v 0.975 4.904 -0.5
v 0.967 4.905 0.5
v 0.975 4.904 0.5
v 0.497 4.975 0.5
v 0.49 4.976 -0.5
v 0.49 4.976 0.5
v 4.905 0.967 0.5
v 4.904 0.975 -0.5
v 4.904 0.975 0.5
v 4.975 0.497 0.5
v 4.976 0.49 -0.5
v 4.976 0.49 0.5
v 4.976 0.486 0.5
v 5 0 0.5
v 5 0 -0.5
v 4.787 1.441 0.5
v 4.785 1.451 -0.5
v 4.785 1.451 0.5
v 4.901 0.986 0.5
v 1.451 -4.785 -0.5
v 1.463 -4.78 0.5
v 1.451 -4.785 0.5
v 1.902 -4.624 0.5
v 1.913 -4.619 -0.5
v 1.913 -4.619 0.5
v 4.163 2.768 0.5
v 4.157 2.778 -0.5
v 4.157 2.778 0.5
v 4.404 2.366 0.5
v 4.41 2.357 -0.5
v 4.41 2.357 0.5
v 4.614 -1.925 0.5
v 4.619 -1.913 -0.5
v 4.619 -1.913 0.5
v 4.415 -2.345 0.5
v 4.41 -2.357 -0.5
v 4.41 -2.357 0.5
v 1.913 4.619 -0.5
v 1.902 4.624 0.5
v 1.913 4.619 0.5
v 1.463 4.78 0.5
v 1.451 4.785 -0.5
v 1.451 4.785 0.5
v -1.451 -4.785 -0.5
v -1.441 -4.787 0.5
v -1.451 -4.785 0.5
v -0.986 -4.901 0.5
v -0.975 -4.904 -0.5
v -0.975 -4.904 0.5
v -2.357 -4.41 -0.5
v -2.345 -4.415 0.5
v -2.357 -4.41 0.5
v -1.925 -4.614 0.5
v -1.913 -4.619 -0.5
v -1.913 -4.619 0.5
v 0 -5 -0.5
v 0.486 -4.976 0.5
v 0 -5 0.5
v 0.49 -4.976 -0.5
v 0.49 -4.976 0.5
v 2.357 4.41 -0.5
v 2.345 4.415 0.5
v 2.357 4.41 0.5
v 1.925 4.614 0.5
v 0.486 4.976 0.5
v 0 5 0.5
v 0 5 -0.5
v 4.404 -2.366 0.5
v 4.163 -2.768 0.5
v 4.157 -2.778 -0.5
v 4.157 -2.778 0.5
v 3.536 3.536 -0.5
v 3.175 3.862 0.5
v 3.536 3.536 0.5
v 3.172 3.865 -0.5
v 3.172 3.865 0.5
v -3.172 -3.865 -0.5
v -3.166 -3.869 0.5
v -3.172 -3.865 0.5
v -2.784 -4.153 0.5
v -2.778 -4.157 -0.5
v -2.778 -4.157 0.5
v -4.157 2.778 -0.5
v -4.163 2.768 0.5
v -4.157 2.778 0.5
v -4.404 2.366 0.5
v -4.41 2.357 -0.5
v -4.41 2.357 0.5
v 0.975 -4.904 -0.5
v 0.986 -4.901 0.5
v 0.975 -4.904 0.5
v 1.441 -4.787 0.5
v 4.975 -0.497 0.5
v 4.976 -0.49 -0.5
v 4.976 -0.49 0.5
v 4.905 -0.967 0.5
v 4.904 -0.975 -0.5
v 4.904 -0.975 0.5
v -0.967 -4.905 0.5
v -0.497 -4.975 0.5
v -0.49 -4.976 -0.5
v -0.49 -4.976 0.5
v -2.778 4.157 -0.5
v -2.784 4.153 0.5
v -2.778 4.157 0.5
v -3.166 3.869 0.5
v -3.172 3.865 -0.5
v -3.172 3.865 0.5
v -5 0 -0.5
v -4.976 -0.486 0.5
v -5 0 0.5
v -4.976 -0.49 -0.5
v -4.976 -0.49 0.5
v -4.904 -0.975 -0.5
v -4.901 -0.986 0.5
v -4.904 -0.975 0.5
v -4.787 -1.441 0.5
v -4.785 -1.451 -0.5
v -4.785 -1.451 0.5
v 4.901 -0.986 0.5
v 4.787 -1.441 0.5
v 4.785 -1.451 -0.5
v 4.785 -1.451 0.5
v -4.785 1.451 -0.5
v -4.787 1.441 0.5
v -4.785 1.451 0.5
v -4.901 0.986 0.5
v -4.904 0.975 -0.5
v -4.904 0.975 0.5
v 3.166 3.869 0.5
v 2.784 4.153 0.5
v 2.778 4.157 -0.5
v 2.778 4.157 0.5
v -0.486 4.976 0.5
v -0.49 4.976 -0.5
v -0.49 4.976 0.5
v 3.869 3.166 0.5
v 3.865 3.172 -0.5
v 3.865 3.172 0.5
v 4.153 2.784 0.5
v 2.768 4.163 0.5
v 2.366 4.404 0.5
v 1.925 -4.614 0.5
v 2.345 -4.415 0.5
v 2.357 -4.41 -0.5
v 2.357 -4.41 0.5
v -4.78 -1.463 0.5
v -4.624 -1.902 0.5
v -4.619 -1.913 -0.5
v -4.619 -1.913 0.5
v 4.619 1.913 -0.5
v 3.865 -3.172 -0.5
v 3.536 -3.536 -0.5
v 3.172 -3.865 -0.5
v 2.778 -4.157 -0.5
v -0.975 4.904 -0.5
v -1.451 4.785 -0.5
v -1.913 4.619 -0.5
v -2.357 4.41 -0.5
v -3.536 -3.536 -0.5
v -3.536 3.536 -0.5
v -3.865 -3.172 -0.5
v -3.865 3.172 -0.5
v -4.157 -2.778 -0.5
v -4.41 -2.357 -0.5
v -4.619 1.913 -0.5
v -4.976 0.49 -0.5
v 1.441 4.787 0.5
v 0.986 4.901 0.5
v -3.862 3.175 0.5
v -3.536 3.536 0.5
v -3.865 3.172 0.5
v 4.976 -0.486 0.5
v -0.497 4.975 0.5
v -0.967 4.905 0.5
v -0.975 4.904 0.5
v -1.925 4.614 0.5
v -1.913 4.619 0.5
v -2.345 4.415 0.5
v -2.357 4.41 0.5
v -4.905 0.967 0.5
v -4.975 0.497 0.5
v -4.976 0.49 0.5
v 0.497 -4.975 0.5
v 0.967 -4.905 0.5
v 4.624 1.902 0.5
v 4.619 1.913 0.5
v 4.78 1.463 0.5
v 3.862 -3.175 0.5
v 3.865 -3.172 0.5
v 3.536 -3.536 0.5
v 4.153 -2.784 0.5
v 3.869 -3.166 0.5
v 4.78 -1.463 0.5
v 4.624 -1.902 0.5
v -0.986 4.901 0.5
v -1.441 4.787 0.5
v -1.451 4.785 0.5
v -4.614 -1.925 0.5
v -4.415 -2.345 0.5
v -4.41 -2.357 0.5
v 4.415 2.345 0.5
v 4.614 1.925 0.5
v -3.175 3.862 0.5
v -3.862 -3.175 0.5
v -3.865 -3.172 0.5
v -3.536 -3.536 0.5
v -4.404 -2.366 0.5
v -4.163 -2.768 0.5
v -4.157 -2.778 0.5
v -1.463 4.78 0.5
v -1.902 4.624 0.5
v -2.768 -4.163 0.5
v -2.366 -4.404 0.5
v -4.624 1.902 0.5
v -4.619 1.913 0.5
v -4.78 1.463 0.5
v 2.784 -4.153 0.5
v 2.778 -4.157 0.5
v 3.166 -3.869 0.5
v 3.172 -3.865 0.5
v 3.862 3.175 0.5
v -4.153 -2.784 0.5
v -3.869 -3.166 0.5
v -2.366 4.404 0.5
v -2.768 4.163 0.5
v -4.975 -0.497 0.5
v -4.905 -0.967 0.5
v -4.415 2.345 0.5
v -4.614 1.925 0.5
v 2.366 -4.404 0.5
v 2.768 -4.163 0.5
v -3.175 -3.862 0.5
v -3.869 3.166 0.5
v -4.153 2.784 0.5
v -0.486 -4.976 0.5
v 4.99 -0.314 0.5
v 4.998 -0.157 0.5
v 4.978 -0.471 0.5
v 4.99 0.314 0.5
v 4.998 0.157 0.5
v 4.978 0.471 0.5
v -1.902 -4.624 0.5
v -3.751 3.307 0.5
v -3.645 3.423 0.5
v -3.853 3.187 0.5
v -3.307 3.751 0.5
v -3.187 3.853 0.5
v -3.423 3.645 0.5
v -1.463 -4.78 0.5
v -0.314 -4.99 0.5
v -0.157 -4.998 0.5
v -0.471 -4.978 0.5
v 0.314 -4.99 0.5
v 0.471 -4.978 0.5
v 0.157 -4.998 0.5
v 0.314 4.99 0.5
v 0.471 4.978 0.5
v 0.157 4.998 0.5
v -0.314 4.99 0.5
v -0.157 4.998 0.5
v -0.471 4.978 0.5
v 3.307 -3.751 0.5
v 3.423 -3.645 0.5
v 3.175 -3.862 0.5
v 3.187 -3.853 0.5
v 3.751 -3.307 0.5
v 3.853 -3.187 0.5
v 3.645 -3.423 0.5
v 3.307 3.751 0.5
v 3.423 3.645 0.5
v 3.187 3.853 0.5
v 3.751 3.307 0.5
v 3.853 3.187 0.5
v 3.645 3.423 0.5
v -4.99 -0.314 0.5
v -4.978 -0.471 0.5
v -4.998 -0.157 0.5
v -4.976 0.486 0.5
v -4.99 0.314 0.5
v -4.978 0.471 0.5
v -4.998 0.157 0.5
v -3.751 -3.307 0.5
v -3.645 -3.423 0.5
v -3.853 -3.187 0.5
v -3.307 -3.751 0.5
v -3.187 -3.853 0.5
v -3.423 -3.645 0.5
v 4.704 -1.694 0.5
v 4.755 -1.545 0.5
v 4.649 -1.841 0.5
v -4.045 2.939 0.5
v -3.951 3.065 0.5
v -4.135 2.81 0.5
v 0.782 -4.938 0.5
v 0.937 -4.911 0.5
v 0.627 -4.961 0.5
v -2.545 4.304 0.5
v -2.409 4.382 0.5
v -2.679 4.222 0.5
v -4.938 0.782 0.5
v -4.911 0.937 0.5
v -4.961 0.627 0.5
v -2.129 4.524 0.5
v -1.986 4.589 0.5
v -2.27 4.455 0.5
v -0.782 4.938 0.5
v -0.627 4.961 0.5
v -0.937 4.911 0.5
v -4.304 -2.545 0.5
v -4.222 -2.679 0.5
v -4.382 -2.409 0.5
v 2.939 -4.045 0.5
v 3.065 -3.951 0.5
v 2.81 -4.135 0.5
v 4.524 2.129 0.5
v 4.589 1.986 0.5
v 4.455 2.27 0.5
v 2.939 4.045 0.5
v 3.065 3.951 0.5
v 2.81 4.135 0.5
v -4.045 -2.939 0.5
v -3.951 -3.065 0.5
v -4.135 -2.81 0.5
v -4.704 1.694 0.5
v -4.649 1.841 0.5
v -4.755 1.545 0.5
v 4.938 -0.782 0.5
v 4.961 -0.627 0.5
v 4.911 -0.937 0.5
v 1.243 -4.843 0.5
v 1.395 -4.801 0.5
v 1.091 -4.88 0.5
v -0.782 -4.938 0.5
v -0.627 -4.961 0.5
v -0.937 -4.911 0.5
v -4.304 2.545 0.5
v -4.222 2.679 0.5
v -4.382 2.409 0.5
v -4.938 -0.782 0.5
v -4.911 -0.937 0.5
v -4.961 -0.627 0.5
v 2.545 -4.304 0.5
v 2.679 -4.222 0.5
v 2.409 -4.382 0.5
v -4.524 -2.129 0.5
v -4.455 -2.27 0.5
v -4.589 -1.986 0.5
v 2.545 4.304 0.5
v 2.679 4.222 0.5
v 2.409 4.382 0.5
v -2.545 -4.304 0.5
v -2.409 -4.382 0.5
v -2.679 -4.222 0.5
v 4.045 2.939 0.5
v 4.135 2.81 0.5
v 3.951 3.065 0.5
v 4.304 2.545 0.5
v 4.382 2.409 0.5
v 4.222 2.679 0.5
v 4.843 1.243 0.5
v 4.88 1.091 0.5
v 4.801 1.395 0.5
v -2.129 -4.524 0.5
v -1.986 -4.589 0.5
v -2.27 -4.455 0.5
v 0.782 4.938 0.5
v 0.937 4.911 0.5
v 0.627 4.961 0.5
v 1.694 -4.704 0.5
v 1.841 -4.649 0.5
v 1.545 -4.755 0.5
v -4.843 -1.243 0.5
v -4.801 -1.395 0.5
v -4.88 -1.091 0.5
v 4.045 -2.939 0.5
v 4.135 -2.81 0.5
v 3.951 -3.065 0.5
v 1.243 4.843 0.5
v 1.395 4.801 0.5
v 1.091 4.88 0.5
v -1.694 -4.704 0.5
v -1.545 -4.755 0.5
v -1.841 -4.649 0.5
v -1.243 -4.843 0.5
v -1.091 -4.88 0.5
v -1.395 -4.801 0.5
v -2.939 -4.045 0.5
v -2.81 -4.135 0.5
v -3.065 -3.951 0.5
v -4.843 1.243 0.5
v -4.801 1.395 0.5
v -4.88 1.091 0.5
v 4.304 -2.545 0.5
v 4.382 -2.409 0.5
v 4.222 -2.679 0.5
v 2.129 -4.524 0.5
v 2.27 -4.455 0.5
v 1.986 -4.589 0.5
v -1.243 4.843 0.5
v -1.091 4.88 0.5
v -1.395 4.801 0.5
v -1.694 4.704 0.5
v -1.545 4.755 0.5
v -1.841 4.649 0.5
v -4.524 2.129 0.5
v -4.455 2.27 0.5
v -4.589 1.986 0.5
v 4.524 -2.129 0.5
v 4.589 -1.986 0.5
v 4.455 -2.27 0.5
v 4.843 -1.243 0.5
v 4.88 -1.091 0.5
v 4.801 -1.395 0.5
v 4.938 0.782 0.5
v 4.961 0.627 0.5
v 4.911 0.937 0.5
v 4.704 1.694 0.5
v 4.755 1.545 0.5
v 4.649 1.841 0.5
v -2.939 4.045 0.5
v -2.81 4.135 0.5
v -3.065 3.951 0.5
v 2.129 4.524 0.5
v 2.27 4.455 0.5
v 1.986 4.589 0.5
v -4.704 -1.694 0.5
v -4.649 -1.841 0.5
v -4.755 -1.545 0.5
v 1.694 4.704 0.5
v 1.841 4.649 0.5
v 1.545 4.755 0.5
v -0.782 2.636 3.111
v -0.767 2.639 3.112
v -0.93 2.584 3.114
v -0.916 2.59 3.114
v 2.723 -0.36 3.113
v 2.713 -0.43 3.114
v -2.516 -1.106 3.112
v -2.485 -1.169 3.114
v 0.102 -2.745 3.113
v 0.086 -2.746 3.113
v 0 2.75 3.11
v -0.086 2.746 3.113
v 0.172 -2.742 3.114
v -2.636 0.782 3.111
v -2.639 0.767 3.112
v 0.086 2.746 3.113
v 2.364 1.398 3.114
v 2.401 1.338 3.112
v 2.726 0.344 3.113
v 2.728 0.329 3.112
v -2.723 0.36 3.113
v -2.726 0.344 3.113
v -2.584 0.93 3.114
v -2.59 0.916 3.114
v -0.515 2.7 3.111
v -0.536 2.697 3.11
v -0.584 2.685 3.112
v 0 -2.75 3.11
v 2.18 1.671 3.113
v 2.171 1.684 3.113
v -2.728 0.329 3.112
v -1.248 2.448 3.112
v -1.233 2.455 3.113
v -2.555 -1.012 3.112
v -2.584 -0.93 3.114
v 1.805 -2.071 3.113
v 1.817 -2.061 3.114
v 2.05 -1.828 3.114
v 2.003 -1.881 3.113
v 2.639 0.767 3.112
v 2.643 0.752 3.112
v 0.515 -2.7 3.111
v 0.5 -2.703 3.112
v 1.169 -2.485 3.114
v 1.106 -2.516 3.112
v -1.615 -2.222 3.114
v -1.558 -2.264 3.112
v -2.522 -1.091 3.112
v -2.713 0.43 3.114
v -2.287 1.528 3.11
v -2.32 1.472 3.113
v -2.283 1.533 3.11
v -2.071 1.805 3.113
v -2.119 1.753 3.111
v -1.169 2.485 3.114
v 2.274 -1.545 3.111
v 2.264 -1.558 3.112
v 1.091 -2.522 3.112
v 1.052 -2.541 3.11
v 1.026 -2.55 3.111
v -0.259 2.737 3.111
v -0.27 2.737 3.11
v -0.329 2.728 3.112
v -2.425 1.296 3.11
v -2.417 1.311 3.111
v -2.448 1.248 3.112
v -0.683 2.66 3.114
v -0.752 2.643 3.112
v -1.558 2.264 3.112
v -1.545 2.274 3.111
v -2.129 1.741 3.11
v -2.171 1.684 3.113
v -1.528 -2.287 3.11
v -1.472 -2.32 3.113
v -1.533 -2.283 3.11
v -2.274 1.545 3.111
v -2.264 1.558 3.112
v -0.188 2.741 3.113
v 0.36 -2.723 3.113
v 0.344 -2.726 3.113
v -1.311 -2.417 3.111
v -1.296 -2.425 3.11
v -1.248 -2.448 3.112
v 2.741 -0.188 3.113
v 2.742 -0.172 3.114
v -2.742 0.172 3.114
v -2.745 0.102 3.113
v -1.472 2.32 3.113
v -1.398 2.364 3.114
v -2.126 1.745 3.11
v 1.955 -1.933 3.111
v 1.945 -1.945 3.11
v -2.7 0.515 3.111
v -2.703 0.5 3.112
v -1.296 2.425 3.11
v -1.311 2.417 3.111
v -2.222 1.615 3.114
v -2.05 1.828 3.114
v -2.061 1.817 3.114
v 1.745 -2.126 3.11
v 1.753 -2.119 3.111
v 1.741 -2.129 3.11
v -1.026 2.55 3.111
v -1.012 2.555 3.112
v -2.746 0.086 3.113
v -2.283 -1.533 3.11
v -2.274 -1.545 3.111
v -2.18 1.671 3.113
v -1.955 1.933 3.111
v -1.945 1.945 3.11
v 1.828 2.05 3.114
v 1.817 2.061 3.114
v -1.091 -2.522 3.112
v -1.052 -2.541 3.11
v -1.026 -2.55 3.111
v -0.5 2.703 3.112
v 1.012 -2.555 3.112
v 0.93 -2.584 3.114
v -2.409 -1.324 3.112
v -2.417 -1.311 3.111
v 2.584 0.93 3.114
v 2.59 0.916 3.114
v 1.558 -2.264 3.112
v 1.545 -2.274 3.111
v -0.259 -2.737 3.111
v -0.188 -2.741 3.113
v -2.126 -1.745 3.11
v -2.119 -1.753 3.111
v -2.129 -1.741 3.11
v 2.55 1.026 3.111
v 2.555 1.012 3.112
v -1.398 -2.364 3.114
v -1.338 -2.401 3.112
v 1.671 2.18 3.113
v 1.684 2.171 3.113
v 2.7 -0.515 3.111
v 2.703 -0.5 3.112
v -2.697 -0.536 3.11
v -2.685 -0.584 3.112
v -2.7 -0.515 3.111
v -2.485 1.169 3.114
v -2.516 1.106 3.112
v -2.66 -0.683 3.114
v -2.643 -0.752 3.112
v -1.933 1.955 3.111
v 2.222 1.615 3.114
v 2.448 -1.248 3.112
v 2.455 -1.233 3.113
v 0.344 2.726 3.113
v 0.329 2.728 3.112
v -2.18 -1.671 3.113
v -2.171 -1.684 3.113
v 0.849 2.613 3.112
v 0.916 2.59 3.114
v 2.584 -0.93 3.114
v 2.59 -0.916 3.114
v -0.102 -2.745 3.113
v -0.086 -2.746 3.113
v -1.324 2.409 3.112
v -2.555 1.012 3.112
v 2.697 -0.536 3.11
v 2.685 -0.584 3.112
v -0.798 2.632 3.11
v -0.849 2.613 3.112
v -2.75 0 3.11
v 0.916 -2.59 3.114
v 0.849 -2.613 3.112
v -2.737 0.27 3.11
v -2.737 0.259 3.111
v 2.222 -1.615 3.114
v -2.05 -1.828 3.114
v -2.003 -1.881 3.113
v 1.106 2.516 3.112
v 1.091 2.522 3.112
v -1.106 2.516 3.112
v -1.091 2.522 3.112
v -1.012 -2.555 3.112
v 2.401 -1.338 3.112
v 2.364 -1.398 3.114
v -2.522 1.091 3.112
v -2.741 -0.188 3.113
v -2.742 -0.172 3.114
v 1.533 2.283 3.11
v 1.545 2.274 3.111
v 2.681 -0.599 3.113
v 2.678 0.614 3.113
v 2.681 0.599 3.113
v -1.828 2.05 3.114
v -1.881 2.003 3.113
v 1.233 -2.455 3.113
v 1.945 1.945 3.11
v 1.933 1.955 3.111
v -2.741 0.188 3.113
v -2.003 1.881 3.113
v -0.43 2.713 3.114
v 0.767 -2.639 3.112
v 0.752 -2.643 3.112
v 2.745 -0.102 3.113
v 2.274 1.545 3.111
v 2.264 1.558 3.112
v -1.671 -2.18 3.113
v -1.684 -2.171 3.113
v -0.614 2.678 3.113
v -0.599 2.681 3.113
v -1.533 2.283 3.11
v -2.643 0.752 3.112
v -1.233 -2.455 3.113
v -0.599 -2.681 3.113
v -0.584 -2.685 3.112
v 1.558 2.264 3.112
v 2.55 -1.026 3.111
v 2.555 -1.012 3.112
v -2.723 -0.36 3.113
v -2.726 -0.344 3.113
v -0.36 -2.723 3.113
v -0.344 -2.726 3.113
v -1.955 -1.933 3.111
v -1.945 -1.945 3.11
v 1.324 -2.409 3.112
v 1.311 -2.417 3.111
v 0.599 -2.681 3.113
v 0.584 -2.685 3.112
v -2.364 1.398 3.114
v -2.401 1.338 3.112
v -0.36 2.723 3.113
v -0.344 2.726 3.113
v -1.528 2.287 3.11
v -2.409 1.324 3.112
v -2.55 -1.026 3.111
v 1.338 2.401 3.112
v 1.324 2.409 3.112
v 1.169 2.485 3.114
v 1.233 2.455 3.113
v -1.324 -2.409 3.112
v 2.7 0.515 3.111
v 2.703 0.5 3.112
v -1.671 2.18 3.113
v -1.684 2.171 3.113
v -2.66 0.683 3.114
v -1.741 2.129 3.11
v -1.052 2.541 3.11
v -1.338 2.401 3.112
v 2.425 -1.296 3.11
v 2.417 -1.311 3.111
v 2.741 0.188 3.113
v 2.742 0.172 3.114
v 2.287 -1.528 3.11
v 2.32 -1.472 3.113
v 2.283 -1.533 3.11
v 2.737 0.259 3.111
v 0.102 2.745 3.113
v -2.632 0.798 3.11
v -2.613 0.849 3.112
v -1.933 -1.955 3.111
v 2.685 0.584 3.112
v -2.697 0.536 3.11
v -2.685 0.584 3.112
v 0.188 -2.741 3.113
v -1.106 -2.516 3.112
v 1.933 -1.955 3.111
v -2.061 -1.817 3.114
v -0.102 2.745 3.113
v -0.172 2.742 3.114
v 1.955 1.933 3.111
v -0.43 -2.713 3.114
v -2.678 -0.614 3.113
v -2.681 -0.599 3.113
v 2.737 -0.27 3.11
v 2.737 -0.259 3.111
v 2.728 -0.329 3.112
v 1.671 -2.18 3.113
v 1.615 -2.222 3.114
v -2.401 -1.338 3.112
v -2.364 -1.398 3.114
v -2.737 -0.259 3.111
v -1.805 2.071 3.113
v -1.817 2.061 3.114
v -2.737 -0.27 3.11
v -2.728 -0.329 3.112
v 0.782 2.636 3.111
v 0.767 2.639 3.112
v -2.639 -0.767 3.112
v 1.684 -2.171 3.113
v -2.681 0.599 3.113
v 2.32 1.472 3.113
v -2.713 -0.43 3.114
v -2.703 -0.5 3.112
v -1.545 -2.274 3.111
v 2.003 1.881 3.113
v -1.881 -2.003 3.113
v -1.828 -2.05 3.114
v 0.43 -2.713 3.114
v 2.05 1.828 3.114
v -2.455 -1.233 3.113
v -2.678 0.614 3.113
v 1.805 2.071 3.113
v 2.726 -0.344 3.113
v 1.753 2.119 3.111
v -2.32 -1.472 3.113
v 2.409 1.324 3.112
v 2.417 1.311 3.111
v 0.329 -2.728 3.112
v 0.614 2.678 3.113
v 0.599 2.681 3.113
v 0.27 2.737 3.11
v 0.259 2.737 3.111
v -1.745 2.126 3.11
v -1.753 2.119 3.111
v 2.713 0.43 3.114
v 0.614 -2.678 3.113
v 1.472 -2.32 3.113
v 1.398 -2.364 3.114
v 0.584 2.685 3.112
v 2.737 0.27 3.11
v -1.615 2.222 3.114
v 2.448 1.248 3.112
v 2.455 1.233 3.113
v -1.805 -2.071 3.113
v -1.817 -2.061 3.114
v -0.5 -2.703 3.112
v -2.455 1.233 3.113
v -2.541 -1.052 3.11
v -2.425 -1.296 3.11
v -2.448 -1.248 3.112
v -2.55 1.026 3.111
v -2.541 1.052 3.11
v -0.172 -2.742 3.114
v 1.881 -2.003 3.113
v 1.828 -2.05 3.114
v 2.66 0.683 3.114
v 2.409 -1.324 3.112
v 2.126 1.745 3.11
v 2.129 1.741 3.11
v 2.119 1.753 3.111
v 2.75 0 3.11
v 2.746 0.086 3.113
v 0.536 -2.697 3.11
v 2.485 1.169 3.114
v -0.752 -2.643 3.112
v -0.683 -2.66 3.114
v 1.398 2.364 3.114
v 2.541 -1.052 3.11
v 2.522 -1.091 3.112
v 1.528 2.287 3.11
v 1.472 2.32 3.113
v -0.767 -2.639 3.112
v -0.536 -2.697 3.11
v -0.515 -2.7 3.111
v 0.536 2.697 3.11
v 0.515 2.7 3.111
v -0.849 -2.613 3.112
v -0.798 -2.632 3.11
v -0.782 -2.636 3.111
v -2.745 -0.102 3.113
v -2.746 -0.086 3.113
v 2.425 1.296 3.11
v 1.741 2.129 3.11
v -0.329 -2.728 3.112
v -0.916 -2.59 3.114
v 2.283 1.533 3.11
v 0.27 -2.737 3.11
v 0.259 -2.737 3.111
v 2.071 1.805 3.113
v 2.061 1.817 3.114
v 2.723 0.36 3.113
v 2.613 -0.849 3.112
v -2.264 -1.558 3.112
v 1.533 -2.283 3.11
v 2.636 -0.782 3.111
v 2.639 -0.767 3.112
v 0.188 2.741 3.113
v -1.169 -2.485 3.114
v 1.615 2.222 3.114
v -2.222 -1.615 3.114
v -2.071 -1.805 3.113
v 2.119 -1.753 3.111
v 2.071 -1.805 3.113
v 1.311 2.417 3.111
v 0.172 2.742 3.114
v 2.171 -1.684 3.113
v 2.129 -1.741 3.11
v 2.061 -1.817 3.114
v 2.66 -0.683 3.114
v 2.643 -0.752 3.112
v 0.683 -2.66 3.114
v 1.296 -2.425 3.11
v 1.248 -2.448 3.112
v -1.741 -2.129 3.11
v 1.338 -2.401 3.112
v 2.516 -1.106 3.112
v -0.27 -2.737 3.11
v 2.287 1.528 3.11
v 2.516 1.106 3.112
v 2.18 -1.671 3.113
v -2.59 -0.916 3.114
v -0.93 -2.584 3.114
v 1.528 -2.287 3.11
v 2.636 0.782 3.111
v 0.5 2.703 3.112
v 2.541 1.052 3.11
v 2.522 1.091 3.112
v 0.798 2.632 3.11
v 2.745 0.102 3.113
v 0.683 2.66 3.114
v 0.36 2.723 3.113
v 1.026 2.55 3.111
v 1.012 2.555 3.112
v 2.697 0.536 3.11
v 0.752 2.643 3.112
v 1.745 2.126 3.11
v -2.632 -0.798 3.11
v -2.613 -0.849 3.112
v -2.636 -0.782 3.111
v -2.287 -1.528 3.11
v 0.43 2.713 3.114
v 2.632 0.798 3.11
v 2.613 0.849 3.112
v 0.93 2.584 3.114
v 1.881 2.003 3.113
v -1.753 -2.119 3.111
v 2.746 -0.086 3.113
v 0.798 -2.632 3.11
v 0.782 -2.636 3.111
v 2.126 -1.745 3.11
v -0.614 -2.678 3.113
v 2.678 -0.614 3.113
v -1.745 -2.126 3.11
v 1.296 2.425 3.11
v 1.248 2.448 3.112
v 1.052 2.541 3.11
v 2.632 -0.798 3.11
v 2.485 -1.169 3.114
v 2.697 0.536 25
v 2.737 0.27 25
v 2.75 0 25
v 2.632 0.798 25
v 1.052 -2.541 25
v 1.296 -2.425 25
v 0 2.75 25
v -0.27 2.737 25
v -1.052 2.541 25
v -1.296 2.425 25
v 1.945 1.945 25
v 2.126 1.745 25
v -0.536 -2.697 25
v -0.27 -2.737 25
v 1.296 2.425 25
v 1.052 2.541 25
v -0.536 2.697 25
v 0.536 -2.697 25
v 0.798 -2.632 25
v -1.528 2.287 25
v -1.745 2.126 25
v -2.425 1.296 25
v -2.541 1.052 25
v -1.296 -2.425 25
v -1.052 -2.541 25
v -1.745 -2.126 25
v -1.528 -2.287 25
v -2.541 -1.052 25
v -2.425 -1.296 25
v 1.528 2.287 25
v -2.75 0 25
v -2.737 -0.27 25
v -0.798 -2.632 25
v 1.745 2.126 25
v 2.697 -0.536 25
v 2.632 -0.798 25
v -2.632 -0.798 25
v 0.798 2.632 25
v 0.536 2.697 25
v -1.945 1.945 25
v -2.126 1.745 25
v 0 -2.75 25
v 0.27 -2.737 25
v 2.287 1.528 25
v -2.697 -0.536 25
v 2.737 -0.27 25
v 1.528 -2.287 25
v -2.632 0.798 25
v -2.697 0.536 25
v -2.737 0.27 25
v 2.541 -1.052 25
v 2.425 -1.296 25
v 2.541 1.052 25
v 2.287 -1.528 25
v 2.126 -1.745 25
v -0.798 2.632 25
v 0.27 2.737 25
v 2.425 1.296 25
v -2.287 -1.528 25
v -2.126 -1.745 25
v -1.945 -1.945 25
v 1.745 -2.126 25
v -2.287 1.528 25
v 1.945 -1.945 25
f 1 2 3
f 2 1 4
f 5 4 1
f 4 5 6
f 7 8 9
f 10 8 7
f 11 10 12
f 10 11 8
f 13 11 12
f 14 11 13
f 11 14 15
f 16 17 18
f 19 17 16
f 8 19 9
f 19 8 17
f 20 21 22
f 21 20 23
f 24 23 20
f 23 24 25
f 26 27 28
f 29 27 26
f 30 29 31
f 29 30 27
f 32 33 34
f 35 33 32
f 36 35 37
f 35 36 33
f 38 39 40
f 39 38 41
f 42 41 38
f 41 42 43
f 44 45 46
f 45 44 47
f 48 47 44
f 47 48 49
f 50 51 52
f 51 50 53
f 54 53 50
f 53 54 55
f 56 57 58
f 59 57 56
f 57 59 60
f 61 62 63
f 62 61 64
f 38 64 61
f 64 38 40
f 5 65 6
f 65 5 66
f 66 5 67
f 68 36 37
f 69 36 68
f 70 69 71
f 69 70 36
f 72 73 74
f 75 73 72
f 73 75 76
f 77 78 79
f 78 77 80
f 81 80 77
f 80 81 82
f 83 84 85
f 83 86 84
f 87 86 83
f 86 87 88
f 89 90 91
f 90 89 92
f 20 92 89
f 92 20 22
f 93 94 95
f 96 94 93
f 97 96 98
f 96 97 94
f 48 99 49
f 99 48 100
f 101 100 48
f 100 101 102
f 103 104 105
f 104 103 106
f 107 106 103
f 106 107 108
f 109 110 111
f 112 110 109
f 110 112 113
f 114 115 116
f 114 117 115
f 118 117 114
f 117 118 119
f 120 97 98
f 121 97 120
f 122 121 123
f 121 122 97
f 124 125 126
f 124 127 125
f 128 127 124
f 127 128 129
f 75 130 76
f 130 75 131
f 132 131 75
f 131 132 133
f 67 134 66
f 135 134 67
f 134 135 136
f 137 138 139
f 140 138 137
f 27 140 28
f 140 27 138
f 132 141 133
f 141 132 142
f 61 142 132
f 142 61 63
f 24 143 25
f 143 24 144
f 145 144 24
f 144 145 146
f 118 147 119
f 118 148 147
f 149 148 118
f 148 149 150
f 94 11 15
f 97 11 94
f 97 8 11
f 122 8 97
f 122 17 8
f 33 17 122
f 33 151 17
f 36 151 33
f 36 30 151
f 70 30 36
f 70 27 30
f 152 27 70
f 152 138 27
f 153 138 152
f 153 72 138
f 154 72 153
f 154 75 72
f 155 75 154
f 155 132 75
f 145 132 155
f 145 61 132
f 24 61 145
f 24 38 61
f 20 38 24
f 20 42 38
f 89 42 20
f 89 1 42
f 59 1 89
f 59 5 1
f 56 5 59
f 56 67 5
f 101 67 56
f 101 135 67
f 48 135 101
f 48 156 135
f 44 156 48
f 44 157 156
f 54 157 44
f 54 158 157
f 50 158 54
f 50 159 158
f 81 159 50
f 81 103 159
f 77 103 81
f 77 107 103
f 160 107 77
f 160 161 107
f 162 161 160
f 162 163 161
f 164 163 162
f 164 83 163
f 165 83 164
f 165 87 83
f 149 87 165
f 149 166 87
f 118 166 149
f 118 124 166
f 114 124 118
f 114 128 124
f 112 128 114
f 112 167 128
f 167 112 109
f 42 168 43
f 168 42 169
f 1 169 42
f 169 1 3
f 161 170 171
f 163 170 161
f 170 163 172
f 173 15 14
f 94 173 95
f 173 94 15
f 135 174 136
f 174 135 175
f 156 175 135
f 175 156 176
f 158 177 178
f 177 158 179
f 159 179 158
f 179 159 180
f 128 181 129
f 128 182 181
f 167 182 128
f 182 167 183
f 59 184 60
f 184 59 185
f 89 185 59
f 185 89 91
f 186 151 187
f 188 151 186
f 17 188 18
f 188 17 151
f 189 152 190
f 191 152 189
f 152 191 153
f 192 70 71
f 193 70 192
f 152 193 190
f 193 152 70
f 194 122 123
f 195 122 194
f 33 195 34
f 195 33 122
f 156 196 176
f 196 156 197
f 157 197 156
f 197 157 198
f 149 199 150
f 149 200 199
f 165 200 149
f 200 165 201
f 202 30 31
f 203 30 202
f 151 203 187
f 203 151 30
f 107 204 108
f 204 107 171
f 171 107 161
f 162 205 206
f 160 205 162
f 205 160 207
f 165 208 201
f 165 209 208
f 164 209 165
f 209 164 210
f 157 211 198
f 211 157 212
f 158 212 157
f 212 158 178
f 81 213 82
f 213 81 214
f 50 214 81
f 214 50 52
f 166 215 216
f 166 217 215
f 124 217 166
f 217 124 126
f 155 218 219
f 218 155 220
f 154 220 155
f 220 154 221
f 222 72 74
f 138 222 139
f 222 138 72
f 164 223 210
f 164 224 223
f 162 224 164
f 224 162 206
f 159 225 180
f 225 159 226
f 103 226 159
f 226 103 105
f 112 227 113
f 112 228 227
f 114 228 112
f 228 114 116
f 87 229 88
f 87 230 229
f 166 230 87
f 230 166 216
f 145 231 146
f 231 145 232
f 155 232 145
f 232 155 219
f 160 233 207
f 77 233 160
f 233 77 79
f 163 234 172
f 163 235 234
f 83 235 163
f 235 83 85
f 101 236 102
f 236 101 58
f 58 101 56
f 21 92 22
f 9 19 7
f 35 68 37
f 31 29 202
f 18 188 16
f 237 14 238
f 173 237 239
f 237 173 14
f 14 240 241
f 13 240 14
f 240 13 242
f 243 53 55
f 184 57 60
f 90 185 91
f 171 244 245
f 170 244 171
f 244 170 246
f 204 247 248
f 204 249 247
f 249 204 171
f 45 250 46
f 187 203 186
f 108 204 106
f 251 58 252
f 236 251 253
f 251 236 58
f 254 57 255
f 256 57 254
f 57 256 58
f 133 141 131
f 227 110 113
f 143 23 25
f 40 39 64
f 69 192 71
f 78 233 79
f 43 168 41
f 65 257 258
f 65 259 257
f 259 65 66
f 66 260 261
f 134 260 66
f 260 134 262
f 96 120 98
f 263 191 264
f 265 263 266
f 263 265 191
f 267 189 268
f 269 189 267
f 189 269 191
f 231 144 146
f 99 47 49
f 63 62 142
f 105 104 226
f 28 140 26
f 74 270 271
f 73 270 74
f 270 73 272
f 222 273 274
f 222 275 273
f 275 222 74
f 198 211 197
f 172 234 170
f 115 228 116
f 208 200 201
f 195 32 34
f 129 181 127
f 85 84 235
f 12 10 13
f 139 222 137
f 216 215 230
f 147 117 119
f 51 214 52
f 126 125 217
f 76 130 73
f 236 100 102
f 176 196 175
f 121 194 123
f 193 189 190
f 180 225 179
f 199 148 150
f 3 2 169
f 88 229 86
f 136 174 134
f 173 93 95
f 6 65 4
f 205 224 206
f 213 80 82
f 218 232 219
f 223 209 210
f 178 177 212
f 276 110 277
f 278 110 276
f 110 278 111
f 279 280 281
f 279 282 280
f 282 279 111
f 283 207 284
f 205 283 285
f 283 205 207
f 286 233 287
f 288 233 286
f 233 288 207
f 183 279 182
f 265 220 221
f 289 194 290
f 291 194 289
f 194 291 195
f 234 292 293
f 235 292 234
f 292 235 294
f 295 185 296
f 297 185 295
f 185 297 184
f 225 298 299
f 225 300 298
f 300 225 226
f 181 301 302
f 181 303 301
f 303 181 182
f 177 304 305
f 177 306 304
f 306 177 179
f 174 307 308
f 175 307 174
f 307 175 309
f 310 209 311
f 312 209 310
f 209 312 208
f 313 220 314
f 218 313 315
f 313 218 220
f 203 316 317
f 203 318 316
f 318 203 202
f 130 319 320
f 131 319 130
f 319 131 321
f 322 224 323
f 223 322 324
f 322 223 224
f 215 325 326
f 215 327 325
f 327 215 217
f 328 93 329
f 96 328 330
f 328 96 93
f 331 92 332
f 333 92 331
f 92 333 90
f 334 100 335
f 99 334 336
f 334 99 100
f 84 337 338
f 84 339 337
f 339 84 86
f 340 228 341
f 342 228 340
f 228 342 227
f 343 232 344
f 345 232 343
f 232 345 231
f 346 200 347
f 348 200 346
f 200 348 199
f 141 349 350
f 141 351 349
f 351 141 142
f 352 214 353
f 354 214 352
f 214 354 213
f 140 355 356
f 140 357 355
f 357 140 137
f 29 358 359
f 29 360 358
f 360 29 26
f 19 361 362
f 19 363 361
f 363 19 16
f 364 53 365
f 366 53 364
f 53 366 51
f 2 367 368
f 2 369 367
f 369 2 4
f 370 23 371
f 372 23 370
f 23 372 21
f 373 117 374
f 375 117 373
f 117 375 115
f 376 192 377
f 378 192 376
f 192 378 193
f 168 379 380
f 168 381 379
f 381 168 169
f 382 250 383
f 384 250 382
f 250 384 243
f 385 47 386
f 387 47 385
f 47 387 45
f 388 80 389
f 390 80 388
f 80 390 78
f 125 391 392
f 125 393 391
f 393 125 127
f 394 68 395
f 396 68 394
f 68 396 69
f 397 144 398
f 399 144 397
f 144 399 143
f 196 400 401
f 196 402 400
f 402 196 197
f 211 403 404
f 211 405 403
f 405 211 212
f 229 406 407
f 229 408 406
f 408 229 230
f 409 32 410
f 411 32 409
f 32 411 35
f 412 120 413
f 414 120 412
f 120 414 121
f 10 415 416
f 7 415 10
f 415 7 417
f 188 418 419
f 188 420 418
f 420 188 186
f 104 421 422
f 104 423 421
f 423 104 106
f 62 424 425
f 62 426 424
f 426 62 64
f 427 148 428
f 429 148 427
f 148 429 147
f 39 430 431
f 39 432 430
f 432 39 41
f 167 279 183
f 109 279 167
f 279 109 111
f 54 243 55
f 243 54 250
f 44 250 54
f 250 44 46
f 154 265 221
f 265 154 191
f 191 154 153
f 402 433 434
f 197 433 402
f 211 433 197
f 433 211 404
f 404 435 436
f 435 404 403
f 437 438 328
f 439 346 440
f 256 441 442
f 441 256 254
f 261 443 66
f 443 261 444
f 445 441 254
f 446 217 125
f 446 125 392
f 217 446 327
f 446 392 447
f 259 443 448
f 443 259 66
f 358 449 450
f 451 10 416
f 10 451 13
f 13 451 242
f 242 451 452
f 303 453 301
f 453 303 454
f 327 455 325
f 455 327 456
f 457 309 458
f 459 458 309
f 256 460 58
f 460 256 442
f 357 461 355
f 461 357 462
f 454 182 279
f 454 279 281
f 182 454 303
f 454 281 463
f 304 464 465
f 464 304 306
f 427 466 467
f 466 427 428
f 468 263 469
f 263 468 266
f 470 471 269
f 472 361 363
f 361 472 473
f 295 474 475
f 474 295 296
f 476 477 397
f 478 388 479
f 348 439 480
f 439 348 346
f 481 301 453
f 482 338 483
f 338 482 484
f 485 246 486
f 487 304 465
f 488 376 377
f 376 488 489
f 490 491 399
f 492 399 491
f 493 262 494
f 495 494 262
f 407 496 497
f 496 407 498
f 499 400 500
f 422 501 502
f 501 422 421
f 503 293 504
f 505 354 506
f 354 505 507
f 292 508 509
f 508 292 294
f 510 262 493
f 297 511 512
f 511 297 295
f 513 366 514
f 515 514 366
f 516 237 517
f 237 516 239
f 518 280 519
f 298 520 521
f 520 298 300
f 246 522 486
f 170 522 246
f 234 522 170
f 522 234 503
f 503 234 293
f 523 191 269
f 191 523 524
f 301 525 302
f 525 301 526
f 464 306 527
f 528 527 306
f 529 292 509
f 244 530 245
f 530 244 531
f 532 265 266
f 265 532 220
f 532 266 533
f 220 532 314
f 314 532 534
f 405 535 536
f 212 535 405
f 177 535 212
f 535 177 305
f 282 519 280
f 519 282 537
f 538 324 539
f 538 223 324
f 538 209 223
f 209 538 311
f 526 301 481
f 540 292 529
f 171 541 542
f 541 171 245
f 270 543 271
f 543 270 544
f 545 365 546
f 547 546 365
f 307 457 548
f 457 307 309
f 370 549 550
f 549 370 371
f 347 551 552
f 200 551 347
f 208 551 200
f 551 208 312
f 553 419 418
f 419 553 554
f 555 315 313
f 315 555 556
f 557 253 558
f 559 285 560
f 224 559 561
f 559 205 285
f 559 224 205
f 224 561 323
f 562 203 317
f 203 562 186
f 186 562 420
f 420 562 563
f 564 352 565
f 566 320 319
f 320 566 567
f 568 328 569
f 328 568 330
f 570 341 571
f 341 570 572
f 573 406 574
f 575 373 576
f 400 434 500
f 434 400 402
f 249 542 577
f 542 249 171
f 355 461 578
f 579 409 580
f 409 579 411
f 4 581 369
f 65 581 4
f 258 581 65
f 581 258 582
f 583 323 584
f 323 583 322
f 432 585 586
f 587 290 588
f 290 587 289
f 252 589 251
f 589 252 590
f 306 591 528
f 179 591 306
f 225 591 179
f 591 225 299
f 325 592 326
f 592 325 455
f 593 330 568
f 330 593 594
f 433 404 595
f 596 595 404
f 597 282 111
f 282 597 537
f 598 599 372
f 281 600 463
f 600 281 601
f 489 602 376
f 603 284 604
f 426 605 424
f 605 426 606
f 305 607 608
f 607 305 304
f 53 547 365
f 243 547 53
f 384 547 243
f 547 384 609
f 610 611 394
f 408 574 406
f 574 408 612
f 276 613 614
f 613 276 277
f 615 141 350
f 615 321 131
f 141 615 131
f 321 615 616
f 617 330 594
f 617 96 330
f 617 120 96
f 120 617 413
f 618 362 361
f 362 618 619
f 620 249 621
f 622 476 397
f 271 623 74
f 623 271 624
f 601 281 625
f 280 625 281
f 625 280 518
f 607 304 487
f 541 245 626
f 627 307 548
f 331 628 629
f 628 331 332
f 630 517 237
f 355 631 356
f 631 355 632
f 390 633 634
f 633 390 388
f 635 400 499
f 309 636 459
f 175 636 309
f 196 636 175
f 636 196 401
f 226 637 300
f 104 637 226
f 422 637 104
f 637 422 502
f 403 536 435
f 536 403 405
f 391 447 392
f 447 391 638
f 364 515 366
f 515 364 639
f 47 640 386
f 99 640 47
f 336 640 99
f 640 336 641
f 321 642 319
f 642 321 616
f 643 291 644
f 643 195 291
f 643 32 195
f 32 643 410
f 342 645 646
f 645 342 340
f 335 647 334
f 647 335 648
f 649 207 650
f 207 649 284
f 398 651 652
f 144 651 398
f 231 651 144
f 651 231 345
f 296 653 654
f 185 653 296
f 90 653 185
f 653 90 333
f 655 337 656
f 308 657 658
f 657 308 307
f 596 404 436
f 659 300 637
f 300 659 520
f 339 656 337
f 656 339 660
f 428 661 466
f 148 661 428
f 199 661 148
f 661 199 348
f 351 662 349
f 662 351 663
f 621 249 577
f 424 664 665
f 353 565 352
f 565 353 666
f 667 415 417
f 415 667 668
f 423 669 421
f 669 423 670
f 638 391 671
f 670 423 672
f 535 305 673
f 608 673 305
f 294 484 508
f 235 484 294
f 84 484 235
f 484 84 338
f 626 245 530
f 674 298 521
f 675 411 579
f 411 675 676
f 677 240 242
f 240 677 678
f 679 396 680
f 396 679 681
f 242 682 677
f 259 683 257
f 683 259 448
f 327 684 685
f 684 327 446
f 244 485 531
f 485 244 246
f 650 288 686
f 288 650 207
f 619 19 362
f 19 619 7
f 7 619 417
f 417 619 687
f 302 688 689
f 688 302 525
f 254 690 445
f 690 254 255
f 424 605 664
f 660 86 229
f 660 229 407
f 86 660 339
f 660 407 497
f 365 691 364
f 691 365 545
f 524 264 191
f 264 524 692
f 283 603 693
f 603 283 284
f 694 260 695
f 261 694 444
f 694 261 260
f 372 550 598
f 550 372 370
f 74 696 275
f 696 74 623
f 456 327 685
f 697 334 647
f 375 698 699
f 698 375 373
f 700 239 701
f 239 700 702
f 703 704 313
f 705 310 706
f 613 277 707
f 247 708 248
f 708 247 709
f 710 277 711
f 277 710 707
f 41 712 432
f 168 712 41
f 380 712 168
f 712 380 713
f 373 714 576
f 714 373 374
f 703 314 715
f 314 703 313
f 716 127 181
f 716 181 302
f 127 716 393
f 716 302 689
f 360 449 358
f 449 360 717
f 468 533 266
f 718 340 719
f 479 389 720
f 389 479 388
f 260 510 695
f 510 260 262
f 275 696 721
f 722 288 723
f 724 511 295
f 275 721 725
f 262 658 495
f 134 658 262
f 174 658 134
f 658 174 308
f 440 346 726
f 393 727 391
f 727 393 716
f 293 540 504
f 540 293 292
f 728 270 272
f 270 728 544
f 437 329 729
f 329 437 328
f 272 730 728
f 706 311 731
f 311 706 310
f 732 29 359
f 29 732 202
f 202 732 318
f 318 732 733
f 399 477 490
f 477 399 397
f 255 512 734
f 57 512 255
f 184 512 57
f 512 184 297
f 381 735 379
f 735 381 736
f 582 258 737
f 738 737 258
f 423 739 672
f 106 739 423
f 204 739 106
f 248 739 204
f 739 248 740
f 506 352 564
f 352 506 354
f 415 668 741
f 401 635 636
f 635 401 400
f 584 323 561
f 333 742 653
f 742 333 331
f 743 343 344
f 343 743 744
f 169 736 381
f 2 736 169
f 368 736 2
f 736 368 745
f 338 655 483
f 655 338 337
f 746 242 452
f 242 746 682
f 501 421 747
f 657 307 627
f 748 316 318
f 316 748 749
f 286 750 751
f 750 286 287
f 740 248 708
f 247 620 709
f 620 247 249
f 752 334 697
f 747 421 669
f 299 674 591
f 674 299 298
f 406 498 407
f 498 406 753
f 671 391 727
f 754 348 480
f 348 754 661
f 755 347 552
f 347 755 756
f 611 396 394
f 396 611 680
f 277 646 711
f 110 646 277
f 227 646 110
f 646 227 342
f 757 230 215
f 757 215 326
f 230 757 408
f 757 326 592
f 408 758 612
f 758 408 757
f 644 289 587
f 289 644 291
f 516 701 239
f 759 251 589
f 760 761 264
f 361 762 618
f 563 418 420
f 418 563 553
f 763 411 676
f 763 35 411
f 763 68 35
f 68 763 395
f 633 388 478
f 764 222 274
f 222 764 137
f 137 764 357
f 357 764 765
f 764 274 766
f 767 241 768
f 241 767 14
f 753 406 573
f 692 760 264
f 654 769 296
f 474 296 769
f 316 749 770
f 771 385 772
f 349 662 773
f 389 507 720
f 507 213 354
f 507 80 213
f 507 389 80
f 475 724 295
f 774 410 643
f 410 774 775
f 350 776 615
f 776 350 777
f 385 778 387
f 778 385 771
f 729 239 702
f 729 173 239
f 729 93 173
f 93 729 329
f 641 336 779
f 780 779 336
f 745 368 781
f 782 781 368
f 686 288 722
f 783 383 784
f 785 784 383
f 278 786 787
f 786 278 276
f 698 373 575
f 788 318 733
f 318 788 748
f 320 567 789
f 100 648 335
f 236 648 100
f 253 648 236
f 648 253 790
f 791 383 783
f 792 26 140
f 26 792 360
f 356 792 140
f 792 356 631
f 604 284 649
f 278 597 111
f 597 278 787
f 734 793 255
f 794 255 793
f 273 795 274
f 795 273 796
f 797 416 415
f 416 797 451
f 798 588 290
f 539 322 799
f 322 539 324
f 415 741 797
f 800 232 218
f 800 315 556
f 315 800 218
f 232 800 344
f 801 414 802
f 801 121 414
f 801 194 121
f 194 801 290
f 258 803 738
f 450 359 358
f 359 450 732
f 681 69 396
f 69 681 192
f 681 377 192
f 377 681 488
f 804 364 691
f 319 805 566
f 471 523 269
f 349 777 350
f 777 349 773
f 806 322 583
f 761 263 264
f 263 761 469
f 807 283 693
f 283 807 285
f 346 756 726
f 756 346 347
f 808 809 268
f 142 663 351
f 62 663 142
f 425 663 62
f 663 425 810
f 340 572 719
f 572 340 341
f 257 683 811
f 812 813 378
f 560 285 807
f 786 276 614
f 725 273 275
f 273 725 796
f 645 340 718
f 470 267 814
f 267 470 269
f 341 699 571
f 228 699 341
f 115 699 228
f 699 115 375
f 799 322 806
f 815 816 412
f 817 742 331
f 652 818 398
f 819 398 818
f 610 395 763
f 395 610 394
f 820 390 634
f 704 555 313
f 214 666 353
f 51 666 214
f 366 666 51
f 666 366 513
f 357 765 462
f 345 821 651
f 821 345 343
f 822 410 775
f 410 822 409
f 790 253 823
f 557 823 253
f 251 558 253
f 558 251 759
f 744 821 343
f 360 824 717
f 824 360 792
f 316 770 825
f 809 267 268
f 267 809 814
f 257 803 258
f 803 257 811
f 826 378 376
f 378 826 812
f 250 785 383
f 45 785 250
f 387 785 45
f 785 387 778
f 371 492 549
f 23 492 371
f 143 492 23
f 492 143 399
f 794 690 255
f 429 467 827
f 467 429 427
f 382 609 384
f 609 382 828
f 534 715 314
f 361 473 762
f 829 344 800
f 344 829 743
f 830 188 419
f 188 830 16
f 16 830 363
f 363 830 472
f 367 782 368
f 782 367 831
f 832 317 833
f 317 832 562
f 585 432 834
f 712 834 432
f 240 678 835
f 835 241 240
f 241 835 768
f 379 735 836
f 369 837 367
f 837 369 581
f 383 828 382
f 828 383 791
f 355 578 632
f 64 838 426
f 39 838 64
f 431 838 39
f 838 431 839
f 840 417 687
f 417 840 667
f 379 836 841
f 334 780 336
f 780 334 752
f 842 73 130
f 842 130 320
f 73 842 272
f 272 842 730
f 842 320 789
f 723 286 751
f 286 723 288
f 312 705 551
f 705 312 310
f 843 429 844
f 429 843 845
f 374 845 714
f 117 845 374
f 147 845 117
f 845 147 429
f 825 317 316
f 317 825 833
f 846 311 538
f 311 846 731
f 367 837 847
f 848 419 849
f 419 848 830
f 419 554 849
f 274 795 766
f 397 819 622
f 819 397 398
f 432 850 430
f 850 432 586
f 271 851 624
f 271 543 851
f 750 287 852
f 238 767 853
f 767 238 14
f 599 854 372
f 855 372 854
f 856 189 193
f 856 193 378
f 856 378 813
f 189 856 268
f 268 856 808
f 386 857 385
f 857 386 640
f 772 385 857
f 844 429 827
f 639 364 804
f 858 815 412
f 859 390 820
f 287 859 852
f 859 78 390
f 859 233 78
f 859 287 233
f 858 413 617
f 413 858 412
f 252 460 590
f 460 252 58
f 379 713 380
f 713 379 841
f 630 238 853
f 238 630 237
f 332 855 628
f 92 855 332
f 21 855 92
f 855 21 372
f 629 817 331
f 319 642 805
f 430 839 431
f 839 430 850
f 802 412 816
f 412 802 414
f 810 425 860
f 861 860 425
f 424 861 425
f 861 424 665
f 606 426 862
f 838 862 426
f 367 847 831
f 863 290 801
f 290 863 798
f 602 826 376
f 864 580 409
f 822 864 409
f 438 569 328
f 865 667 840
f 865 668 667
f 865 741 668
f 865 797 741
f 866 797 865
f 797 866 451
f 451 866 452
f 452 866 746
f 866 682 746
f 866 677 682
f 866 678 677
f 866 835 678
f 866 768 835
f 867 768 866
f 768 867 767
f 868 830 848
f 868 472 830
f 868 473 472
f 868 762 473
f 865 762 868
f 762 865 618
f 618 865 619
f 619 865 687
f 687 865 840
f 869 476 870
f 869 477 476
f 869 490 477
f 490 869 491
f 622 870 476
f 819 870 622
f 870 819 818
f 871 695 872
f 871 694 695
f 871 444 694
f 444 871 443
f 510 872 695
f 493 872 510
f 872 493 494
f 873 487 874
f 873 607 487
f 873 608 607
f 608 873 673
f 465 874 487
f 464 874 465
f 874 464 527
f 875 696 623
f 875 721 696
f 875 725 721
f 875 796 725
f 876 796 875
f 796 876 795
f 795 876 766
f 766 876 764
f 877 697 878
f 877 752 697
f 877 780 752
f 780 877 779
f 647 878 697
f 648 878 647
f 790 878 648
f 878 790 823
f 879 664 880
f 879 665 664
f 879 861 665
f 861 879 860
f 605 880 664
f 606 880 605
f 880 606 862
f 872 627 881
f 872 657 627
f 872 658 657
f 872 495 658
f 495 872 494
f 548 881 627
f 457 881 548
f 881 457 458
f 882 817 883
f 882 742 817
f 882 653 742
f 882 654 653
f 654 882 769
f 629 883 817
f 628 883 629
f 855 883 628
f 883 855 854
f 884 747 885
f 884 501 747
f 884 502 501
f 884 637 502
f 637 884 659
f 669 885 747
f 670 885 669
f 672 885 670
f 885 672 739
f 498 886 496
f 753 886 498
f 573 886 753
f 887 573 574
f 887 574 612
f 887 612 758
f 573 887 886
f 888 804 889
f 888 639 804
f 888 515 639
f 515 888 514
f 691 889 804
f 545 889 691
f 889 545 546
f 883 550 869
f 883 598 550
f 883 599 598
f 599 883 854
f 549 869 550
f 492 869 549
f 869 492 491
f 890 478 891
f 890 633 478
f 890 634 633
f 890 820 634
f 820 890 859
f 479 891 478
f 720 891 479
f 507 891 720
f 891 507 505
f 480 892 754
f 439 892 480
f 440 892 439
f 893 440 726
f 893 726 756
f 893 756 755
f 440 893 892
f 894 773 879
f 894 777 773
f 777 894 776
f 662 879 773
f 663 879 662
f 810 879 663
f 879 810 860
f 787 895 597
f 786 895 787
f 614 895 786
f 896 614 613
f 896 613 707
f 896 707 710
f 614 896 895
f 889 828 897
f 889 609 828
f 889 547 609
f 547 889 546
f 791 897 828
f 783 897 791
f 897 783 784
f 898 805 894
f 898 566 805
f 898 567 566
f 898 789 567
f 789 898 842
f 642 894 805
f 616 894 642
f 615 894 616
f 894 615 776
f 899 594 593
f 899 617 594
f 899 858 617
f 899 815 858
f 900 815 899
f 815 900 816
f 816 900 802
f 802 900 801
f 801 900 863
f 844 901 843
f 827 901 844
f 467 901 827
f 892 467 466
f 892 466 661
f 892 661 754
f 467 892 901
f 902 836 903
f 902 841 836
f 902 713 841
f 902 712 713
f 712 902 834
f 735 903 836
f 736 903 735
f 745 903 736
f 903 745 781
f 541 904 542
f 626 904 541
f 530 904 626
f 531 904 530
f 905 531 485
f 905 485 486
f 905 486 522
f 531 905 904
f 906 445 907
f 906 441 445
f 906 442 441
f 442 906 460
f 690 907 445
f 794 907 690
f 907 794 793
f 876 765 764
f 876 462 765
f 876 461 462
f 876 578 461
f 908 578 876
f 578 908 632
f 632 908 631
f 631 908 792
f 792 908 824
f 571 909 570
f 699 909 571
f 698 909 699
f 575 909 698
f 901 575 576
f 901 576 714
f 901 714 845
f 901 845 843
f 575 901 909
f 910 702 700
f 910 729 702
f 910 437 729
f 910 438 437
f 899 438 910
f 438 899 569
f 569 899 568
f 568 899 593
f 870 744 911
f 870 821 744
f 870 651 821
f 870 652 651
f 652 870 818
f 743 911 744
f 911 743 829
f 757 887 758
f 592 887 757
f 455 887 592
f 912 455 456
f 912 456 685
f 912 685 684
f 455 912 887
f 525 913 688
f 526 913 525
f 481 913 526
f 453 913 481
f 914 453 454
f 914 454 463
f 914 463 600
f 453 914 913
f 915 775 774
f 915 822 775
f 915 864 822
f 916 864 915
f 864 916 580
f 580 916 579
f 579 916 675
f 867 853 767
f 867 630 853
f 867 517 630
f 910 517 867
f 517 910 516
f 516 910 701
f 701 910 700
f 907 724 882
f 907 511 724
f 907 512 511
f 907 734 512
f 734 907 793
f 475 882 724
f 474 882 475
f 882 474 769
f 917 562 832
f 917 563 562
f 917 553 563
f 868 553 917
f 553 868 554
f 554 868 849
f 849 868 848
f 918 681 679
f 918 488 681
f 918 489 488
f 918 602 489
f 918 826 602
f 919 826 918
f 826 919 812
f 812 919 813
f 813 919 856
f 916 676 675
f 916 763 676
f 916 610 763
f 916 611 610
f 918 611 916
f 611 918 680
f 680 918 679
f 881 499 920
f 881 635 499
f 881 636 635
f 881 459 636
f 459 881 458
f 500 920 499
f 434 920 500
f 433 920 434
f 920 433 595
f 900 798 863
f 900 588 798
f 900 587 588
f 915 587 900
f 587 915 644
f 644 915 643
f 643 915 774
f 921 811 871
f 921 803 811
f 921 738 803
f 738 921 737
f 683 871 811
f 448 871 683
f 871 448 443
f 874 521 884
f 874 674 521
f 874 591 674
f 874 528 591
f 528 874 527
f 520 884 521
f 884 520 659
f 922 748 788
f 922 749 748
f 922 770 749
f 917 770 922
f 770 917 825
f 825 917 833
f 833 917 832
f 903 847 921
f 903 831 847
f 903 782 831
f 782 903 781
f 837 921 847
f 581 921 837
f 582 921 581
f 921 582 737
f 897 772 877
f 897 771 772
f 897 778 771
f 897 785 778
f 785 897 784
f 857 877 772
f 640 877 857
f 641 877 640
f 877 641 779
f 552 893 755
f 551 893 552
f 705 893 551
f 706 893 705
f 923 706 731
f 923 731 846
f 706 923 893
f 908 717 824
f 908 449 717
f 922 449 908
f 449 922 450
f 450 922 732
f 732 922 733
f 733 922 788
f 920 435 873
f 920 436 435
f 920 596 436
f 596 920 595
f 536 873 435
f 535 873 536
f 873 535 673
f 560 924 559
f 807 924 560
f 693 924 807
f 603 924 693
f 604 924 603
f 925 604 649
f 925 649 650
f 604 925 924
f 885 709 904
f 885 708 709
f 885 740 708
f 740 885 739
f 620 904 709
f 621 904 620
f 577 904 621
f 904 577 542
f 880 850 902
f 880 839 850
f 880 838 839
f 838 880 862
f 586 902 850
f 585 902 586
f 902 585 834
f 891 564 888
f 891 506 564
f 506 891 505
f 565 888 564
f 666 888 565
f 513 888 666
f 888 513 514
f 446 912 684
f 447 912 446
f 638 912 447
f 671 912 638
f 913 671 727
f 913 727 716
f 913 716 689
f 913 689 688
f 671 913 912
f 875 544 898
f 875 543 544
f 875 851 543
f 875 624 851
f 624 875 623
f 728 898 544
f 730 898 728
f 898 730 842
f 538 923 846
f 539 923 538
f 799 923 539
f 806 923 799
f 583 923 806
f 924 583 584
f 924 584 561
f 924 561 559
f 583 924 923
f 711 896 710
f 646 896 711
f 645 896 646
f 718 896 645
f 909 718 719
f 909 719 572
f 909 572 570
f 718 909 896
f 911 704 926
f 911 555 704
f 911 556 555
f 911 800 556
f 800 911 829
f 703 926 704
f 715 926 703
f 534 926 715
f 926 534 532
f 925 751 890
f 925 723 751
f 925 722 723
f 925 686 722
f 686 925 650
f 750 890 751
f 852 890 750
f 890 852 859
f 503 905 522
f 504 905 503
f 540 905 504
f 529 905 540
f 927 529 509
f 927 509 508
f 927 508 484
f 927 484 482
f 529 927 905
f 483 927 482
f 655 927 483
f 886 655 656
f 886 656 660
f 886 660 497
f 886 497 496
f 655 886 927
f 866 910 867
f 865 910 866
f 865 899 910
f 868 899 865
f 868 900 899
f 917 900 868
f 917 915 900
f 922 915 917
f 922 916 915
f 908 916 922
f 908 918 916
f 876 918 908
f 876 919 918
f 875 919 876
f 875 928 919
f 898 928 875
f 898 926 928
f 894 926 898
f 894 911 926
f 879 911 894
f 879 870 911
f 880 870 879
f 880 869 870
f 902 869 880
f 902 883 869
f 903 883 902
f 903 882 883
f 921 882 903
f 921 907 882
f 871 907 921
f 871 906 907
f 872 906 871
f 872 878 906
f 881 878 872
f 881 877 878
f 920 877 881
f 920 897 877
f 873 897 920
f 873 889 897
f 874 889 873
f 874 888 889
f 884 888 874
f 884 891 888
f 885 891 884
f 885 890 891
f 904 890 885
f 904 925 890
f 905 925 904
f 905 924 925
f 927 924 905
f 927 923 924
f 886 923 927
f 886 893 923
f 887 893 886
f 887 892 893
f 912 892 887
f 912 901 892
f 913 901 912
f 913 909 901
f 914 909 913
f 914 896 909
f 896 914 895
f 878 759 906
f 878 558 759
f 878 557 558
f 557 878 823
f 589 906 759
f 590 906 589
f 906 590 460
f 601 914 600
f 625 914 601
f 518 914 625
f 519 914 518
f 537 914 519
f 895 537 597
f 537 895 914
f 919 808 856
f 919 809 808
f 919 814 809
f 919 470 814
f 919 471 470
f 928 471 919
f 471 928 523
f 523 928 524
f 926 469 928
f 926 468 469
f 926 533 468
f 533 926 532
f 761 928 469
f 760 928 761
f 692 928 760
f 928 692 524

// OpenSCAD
// Create hole and countersink space that can be used
// to diff to create a proper hole for an M screw
// 
// Original design only for M5

//m5_length=16;
//m5_countersink_depth=2.9;
//m5_countersink_top_diameter=10.0;
//m5_diameter=5.5;

//Simple vector with parameters.
//Add in the values as we collect them
//Yes,the first one is for 0, so leave at 0
countersink_top_diameter=[0,0,0,0,0,10.0];
countersink_depth=[0,0,0,0,0,2.9];
diameter=[0,0,0,0,0,5.5];

module countersink(top_radius, hole_radius, sink_depth)
{
      rotate_extrude($fn=200) 
      polygon([[0,0],[top_radius,0],[hole_radius,sink_depth],[0,sink_depth]]);
}

module countersinkScrewHole(Msize=5,length=25)
{
    assert(Msize==5, "Invalid M size");
      cylinder(d=countersink_top_diameter[Msize],h=1,center=true, $fn=64);
      translate([0,0,0.5])countersink(countersink_top_diameter[Msize]/2,2.5,countersink_depth[Msize]);
      translate([0,0,length/2])cylinder(d=diameter[Msize],h=length,center=true, $fn=64);
}



countersinkScrewHole(Msize=5,length=25);
